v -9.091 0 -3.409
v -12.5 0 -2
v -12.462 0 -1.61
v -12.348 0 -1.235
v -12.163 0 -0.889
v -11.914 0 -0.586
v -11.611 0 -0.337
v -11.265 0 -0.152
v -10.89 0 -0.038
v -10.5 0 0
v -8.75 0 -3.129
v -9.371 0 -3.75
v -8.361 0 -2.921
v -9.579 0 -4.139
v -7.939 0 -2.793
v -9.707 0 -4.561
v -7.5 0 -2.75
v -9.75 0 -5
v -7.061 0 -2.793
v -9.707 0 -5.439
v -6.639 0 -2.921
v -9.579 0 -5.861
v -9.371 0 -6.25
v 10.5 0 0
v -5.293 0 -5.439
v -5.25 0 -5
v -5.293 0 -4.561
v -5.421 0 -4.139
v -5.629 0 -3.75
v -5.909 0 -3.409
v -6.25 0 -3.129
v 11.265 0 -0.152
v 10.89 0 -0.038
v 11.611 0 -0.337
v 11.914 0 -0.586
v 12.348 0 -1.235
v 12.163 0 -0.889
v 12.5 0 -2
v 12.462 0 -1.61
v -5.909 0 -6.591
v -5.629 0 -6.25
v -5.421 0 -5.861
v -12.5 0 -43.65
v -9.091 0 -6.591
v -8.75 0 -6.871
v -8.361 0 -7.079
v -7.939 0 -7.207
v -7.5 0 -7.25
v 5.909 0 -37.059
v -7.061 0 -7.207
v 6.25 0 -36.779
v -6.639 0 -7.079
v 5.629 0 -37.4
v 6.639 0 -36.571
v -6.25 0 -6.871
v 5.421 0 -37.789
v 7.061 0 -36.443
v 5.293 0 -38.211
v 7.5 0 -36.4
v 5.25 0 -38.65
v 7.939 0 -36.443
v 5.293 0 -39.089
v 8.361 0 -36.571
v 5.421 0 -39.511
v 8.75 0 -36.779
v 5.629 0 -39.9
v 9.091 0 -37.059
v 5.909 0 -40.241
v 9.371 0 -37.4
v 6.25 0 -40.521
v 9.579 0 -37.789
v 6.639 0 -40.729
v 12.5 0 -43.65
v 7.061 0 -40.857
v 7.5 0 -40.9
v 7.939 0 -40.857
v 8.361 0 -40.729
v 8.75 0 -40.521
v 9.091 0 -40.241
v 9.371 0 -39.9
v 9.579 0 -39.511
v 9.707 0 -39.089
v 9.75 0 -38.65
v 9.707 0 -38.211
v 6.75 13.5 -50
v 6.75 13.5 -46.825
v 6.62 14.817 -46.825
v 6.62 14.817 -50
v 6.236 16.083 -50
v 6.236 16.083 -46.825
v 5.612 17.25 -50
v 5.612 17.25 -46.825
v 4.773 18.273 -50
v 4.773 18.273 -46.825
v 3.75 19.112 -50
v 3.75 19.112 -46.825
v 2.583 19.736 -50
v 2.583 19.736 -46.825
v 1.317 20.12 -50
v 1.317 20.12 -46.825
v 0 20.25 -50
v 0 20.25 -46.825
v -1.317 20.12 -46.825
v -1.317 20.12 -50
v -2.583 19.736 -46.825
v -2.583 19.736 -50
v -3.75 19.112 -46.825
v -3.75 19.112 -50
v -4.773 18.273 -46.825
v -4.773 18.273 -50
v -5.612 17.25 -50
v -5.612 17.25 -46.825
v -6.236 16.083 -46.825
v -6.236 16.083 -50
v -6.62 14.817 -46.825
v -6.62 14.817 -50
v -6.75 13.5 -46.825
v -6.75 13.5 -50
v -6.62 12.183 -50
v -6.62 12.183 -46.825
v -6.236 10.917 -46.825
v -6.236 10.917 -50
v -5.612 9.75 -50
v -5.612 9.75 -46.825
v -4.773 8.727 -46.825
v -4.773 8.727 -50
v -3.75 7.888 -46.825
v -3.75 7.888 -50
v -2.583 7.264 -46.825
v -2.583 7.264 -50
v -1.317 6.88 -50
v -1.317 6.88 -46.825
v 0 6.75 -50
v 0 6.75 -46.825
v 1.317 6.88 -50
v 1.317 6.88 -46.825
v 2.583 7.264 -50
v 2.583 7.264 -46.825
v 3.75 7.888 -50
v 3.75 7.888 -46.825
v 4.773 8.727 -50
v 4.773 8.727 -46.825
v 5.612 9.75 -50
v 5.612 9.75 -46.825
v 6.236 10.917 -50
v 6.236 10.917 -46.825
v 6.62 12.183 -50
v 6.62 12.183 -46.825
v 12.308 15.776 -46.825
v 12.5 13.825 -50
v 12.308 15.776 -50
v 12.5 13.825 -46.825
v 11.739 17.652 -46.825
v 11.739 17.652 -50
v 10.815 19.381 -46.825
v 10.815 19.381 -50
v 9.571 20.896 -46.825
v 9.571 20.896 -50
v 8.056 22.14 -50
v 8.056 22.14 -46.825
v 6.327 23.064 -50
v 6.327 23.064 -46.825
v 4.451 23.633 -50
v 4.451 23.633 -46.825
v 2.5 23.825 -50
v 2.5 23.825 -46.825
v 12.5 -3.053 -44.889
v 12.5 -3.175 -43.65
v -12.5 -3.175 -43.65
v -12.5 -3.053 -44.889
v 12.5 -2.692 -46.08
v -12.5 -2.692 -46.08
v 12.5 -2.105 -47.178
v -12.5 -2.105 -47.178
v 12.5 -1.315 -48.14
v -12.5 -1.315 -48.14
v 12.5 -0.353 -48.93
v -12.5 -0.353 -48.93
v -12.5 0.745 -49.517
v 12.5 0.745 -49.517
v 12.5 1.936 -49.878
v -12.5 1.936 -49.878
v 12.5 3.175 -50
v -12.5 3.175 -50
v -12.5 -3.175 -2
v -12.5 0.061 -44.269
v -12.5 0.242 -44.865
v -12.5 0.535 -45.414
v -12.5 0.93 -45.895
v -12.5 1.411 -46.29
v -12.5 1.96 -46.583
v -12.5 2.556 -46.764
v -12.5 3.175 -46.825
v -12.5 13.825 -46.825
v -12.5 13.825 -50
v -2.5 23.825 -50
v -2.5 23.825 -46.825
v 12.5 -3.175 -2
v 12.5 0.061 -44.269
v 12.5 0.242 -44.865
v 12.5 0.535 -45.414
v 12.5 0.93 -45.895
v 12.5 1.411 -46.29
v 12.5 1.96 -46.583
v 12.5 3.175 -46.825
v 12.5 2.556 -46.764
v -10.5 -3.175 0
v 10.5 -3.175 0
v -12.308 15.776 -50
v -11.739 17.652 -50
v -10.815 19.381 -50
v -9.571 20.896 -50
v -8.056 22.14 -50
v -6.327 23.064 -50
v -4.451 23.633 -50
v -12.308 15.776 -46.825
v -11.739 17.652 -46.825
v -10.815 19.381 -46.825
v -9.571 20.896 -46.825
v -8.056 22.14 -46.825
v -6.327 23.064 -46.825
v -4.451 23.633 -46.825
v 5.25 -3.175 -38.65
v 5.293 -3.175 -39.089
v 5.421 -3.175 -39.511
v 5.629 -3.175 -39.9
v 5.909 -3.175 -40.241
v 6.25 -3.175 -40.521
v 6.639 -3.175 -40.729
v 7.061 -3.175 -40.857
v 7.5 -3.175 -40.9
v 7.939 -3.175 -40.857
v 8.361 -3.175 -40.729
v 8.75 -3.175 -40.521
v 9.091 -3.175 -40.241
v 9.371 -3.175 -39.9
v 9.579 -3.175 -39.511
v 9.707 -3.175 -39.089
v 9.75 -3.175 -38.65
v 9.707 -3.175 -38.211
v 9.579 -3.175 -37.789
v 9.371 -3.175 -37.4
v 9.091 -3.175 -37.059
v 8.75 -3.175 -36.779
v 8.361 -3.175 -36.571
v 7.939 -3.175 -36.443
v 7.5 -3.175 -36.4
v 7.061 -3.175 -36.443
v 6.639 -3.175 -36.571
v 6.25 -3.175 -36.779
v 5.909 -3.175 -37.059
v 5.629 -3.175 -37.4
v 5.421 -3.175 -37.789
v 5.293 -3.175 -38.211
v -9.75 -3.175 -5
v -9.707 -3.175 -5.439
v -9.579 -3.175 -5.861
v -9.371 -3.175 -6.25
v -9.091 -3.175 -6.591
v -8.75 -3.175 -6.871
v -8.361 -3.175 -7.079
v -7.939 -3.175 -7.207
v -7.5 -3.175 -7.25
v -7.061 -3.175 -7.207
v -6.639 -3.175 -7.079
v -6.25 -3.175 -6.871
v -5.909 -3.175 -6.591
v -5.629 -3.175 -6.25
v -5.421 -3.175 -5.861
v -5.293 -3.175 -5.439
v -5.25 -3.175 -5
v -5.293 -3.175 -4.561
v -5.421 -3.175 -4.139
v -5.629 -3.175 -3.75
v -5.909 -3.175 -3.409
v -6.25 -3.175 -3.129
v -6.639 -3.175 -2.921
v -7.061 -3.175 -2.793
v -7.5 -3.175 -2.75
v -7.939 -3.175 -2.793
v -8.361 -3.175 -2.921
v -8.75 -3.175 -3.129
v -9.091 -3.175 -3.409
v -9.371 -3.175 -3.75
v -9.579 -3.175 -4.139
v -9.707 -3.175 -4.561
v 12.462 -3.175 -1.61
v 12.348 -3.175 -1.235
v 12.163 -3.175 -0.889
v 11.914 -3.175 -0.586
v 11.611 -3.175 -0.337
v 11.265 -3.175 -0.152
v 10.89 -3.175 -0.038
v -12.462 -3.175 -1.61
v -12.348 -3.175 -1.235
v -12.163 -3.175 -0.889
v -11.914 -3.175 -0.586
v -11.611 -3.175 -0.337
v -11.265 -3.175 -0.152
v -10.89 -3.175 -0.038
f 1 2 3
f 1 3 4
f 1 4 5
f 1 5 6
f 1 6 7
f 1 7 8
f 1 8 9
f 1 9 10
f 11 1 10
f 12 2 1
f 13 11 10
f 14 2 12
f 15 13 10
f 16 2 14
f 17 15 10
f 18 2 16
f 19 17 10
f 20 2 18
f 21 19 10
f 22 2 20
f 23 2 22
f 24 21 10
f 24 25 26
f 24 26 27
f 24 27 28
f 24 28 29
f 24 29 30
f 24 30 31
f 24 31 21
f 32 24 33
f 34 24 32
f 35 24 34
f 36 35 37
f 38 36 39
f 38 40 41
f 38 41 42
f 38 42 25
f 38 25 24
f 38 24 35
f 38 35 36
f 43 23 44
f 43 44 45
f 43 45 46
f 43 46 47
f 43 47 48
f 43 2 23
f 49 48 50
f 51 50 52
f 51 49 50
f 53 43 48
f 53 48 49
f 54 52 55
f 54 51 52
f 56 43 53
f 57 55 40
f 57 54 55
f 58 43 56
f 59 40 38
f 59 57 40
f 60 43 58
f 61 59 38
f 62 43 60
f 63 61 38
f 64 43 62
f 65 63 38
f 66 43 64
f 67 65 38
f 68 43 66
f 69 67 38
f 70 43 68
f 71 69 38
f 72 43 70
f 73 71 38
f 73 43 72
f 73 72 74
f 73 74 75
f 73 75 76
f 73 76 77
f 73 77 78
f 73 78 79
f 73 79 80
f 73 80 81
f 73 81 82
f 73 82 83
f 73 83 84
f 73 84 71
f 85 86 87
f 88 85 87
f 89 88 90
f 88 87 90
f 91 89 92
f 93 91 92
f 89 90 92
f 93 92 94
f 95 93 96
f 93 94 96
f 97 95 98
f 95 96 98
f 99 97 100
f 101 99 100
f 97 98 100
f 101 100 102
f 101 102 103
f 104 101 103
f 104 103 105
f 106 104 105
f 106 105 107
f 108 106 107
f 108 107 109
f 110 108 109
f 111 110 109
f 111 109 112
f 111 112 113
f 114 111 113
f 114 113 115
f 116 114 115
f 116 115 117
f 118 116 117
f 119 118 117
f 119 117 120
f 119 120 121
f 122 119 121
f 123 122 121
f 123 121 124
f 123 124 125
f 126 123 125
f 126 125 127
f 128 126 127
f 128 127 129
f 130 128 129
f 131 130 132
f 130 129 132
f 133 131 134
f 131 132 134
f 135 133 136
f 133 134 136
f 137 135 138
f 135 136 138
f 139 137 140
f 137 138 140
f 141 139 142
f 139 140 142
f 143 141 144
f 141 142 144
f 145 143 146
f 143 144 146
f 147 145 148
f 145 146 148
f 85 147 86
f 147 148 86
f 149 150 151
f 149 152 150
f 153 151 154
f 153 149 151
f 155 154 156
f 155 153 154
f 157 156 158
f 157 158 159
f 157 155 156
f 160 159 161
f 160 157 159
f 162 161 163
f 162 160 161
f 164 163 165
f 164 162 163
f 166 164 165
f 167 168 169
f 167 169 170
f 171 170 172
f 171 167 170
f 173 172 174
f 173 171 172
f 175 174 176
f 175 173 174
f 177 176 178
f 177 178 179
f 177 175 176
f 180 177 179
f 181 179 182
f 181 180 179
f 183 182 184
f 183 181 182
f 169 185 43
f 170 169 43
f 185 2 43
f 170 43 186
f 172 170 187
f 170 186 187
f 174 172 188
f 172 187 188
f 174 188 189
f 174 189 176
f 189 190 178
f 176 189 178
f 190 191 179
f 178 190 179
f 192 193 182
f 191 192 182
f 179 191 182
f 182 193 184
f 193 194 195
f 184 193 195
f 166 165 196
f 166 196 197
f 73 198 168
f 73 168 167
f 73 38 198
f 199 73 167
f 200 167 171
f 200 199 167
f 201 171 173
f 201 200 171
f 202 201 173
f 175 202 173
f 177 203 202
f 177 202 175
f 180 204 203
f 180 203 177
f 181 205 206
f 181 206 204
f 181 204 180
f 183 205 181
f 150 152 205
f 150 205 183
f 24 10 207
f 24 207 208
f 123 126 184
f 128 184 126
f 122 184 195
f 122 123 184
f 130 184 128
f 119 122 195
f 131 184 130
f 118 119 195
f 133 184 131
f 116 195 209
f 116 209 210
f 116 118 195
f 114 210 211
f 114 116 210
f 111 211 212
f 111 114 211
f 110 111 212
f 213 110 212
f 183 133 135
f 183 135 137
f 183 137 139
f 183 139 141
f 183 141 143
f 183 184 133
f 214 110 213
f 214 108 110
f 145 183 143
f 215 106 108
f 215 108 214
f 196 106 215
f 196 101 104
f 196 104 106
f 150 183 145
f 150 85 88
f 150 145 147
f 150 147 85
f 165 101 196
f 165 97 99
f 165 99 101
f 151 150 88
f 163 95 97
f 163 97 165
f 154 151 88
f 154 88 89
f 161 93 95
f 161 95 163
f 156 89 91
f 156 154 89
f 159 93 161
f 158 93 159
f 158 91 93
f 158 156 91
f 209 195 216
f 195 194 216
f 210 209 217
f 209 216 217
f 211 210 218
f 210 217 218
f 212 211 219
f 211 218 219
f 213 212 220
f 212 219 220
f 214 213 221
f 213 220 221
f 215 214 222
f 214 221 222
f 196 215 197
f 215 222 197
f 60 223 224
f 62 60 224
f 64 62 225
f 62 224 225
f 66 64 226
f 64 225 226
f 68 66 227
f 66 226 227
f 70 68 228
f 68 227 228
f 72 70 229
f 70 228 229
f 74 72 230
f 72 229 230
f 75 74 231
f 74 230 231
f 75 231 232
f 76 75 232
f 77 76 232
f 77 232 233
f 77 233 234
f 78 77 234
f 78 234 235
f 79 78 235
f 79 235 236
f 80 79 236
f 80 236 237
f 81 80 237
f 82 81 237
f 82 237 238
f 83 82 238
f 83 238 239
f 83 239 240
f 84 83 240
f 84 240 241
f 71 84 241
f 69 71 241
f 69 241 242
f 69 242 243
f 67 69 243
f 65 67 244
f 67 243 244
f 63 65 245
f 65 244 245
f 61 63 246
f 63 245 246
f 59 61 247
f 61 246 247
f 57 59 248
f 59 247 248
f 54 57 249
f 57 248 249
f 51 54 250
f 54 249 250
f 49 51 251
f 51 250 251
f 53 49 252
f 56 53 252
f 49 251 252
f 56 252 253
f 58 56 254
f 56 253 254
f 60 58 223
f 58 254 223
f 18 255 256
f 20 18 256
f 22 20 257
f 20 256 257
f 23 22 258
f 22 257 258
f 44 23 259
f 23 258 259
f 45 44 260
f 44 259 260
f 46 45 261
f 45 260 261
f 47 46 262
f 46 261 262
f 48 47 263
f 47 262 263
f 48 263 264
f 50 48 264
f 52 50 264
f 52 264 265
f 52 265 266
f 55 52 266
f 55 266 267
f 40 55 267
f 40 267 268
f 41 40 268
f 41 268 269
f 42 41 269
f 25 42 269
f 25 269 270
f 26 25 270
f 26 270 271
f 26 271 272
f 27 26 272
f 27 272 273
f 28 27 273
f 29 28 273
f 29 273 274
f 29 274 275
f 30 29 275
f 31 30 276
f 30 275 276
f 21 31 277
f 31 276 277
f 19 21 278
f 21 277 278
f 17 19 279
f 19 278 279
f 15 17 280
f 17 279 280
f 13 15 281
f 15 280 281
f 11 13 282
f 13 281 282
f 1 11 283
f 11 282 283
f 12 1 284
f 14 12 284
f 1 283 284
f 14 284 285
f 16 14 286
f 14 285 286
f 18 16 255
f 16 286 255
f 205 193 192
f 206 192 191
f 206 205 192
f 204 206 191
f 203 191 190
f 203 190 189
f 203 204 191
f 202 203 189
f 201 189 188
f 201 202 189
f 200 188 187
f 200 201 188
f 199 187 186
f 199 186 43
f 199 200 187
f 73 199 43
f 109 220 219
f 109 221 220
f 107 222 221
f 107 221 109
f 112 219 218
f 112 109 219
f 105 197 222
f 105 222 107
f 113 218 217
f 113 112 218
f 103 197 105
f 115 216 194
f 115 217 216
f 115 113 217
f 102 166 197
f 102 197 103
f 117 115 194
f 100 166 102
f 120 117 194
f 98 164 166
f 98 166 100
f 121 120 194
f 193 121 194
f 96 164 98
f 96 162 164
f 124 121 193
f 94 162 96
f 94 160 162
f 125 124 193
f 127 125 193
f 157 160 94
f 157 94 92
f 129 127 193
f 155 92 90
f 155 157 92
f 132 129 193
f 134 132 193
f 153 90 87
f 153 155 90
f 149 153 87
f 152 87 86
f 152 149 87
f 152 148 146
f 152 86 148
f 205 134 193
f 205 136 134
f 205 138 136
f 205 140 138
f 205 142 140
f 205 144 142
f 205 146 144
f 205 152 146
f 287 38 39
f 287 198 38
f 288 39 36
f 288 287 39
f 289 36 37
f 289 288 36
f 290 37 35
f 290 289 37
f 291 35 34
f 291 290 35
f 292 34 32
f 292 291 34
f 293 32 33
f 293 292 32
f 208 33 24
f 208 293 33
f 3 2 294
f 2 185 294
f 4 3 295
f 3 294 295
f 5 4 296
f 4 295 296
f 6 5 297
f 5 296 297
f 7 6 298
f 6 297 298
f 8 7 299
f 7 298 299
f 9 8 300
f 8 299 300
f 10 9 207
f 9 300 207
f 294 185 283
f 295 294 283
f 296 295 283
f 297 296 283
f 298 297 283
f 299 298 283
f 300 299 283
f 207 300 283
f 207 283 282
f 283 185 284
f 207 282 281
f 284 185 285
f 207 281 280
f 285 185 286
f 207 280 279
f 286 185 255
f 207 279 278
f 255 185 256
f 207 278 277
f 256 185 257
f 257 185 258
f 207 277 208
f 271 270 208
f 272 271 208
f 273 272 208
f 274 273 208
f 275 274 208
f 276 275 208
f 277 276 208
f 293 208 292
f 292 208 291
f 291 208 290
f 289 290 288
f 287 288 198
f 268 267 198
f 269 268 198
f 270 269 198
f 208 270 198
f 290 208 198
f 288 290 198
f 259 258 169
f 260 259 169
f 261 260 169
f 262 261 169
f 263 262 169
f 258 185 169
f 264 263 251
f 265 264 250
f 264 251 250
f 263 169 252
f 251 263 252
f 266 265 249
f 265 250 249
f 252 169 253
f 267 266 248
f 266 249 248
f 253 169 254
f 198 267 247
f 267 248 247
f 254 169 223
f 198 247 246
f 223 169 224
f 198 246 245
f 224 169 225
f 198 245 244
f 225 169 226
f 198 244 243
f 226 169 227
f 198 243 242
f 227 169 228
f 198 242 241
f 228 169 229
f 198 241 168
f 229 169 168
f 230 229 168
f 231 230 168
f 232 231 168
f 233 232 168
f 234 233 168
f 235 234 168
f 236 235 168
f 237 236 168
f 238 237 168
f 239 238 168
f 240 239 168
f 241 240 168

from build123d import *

# Parameters (mm, degrees)
SKETCH1_W                    = 25
SKETCH1_H                    = 50
BASE_FLANGE1_DEPTH           = 3.175
EDGE_FLANGE1_STRIP_W         = 19.05
EDGE_FLANGE1_STRIP_H         = 3.175
EDGE_FLANGE1_STRIP_CUT_DEPTH = 25
EDGE_FLANGE1_DEPTH           = 25
M12_CLEARANCE_HOLE1_D        = 13.5
M4_CLEARANCE_HOLE1_D         = 4.5
FILLET1_R                    = 10
FILLET2_R                    = 2


# Sheet-metal steps are written as plain solids
with BuildPart() as part:
    # Sketch1 → Base-Flange1 (new body)
    with BuildSketch(Plane(origin=(0, 0, 0), x_dir=(1, 0, 0), z_dir=(0, 1, 0))):
        with Locations((0, 25)):
            Rectangle(SKETCH1_W, SKETCH1_H)
    extrude(amount=-BASE_FLANGE1_DEPTH)

    # Edge-Flange1 strip (across the edge) → Edge-Flange1 strip cut (cut)
    with BuildSketch(Plane(origin=(12.5, 0, -50), x_dir=(0, 0, 1), z_dir=(-1, 0, 0))):
        with Locations((-3.175, -1.5875)):
            Rectangle(EDGE_FLANGE1_STRIP_W, EDGE_FLANGE1_STRIP_H)
    extrude(amount=EDGE_FLANGE1_STRIP_CUT_DEPTH, mode=Mode.SUBTRACT)

    # Edge-Flange1 section (across the edge) → Edge-Flange1 (add)
    with BuildSketch(Plane(origin=(12.5, 0, -50), x_dir=(0, 0, 1), z_dir=(-1, 0, 0))):
        with BuildLine():
            Line((0, 3.175), (0, 23.825))
            Line((0, 23.825), (3.175, 23.825))
            Line((3.175, 23.825), (3.175, 3.175))
            ThreePointArc((3.175, 3.175), (4.10493597, 0.92993597), (6.35, 0))
            Line((6.35, 0), (6.35, -3.175))
            ThreePointArc((6.35, -3.175), (1.859871939, -1.315128061), (0, 3.175))
        make_face()
    extrude(amount=EDGE_FLANGE1_DEPTH)

    # M12 Clearance Hole1 (through all)
    with Locations(Plane(origin=(0, 0, -50), x_dir=(-1, 0, 0), z_dir=(0, 0, -1))):
        with Locations((0, 13.5)):
            Hole(M12_CLEARANCE_HOLE1_D / 2)

    # M4 Clearance Hole1 (through all)
    with Locations(Plane(origin=(0, 0, 0), x_dir=(1, 0, 0), z_dir=(0, 1, 0))):
        with Locations((-7.5, 5), (7.5, 38.65)):
            Hole(M4_CLEARANCE_HOLE1_D / 2)

    # Fillet1
    fillet1_edges = [part.edges().sort_by_distance(p)[0] for p in [
        (12.5, 23.825, -48.4125),
        (-12.5, 23.825, -48.4125),
    ]]
    fillet(fillet1_edges, radius=FILLET1_R)

    # Fillet2
    fillet2_edges = [part.edges().sort_by_distance(p)[0] for p in [
        (12.5, -1.5875, 0),
        (-12.5, -1.5875, 0),
    ]]
    fillet(fillet2_edges, radius=FILLET2_R)


solid = part.part
